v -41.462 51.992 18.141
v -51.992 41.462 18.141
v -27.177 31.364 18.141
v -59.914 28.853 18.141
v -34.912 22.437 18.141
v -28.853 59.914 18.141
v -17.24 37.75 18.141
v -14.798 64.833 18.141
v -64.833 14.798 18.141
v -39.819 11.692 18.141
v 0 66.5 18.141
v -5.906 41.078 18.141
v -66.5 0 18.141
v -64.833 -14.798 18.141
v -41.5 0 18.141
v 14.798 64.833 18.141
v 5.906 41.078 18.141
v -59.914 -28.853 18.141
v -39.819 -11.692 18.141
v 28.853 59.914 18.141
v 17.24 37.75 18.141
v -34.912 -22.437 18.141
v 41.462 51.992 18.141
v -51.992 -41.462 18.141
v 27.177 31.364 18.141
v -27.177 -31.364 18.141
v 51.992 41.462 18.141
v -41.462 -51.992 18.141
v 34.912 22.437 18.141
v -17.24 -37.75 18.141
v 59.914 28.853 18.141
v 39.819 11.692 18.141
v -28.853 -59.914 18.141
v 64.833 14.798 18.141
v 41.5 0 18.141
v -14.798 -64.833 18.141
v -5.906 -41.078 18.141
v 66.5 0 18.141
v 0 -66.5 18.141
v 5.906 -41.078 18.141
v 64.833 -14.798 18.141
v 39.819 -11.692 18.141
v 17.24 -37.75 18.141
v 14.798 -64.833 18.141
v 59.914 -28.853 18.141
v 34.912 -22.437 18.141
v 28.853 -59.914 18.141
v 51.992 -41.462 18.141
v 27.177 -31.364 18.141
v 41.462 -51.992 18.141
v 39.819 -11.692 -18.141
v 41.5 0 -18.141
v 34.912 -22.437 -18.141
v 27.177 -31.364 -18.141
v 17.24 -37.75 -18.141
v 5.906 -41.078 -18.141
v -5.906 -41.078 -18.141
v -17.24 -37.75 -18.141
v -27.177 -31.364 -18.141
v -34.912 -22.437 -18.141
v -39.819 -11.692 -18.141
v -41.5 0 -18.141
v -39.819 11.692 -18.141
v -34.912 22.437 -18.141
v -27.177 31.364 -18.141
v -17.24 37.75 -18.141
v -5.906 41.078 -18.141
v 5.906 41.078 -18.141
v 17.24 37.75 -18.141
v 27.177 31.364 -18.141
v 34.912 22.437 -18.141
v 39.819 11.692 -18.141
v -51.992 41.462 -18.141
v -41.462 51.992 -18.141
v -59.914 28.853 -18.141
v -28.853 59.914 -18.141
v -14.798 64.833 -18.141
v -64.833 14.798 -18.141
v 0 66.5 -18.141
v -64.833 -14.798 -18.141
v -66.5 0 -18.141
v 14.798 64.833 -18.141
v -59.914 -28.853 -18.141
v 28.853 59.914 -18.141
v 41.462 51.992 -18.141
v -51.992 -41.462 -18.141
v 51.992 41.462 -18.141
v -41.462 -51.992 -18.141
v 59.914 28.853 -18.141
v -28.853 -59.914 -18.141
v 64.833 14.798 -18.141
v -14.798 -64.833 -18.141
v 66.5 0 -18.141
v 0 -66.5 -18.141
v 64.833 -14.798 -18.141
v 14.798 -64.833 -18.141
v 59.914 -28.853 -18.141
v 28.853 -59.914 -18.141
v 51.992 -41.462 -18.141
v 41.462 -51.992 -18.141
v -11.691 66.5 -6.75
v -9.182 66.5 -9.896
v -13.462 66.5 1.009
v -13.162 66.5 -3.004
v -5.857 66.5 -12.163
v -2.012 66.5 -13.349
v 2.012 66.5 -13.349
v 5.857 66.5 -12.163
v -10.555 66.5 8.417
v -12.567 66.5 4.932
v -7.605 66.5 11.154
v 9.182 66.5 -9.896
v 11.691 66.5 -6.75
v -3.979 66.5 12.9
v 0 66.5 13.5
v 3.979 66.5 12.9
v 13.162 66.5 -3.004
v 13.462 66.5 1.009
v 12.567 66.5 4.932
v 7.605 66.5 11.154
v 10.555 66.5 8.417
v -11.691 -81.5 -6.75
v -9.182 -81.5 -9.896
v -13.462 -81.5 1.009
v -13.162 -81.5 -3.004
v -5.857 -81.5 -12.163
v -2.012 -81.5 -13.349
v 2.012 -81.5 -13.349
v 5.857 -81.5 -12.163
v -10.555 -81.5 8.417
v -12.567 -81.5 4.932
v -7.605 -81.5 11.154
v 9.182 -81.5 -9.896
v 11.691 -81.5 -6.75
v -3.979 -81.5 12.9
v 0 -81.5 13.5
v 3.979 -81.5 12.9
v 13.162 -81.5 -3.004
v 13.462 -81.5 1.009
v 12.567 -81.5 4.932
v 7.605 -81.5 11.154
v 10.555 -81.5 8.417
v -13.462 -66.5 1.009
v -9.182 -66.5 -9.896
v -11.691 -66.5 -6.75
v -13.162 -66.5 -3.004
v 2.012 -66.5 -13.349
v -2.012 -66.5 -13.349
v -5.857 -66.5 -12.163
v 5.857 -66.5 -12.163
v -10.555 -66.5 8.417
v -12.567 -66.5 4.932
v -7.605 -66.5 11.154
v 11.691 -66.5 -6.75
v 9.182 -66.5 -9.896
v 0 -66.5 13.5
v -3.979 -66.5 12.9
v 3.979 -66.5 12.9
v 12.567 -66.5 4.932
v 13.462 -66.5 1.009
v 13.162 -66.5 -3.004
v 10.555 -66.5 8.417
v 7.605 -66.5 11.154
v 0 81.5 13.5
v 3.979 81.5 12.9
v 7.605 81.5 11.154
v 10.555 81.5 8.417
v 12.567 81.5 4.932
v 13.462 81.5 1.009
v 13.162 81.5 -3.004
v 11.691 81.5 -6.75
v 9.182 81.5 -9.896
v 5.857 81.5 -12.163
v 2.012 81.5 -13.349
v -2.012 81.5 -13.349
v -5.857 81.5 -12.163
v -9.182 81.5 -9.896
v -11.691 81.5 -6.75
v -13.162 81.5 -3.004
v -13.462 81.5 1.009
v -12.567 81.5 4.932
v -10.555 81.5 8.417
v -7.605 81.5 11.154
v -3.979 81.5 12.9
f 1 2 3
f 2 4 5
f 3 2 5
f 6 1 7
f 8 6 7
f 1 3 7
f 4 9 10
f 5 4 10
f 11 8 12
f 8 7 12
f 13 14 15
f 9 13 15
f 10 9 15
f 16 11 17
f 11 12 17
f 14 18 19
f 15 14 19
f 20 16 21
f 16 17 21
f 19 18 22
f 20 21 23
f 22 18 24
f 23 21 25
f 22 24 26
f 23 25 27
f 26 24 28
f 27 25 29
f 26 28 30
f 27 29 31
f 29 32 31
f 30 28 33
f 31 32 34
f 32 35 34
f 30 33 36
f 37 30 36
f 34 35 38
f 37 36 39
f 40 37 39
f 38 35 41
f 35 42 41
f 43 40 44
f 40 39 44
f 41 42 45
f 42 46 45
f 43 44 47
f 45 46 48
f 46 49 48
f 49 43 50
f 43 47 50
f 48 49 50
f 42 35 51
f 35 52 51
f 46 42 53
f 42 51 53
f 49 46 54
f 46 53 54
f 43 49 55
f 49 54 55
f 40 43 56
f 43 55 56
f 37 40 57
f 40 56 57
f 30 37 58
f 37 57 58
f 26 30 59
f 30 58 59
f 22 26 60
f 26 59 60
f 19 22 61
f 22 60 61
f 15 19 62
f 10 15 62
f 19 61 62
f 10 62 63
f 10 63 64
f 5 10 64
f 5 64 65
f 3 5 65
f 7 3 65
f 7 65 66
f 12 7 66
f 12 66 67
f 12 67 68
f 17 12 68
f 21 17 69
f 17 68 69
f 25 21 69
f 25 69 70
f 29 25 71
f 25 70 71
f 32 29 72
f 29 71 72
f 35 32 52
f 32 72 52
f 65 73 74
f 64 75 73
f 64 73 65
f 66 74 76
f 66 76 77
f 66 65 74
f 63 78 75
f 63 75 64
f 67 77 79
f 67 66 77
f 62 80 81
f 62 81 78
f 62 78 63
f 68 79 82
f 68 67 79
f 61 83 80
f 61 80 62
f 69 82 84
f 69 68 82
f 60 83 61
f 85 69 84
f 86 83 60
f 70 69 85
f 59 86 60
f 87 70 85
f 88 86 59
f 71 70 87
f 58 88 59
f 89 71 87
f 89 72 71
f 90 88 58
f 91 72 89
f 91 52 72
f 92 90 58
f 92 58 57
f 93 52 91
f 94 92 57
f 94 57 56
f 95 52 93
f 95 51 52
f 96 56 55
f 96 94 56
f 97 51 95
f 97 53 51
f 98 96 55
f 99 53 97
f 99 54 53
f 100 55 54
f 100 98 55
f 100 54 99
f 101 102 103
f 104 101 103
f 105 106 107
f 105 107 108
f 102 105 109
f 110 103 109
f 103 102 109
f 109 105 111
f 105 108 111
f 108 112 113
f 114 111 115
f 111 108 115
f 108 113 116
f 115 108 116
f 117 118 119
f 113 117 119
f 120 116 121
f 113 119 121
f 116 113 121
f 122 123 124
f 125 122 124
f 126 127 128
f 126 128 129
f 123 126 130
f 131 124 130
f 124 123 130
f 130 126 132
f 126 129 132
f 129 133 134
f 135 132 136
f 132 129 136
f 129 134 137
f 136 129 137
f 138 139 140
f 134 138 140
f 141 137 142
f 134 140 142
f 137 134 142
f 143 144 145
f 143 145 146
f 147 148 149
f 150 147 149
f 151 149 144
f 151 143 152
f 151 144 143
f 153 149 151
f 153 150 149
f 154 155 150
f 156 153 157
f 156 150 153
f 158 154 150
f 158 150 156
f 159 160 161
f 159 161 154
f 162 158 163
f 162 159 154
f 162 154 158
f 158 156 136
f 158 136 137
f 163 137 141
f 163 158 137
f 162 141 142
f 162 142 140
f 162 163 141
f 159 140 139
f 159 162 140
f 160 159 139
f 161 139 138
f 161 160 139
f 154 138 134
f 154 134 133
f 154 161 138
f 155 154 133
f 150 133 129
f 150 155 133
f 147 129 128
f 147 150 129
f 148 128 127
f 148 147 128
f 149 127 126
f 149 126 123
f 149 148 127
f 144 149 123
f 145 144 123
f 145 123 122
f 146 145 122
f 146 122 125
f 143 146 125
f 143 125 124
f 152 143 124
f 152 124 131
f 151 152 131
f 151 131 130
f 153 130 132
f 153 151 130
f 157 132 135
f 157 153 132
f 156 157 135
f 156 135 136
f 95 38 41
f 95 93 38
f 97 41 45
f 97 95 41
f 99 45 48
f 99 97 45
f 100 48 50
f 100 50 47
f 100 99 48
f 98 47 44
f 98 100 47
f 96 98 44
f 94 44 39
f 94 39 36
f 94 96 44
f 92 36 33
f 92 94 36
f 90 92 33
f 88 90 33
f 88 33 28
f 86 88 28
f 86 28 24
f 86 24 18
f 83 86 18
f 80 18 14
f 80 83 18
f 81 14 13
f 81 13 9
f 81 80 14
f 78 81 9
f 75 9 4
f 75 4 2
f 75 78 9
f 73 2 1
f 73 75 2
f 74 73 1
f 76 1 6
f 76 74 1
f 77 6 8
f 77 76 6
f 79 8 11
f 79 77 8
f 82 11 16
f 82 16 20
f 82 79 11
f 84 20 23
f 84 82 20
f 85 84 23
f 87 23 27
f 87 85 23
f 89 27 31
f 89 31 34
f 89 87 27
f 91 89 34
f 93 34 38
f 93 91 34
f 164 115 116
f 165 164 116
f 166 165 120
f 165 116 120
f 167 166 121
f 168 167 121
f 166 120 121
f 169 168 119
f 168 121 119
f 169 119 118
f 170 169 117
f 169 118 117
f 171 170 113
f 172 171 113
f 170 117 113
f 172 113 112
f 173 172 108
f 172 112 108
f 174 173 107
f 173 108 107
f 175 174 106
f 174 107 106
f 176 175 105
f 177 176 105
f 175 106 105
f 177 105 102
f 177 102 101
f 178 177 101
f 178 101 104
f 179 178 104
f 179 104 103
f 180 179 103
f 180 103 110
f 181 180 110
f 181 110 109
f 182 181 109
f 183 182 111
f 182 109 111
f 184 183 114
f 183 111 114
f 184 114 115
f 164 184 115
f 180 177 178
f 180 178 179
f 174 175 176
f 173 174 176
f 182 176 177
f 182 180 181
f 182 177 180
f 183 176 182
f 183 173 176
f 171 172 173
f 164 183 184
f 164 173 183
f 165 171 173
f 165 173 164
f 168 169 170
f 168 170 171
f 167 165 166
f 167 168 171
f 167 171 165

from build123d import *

# Parameters (mm, degrees)
SKETCH1_W           = 25
SKETCH1_H           = 36.281437126
SKETCH3_R           = 13.5
BOSS_EXTRUDE1_DEPTH = 15
SKETCH4_R           = 13.5
BOSS_EXTRUDE3_DEPTH = 15


with BuildPart() as part:
    # Sketch1 → Revolve1 (revolve)
    with BuildSketch(Plane(origin=(0, 0, 0), x_dir=(1, 0, 0), z_dir=(0, 1, 0)), mode=Mode.PRIVATE) as revolve1_sk:
        with Locations((-54, 0)):
            Rectangle(SKETCH1_W, SKETCH1_H)
    revolve(revolve1_sk.sketch.rotate(Axis((0, 0, 0), (0, 0, -1)), 180), axis=Axis((0, 0, 0), (0, 0, -1)))


with BuildPart() as body_2:
    # Sketch3 → Boss-Extrude1 (new body)
    with BuildSketch(Plane(origin=(0, 66.5, 0), x_dir=(1, 0, 0), z_dir=(0, 1, 0))):
        with Locations(Location((0, 0, 0), (0, 0, 270))):
            Circle(SKETCH3_R)
    extrude(amount=BOSS_EXTRUDE1_DEPTH)


with BuildPart() as body_3:
    # Sketch4 → Boss-Extrude3 (new body)
    with BuildSketch(Plane(origin=(0, -66.5, 0), x_dir=(1, 0, 0), z_dir=(0, 1, 0))):
        with Locations(Location((0, 0, 0), (0, 0, 270))):
            Circle(SKETCH4_R)
    extrude(amount=-BOSS_EXTRUDE3_DEPTH)


solid = Compound([part.part, body_2.part, body_3.part])
